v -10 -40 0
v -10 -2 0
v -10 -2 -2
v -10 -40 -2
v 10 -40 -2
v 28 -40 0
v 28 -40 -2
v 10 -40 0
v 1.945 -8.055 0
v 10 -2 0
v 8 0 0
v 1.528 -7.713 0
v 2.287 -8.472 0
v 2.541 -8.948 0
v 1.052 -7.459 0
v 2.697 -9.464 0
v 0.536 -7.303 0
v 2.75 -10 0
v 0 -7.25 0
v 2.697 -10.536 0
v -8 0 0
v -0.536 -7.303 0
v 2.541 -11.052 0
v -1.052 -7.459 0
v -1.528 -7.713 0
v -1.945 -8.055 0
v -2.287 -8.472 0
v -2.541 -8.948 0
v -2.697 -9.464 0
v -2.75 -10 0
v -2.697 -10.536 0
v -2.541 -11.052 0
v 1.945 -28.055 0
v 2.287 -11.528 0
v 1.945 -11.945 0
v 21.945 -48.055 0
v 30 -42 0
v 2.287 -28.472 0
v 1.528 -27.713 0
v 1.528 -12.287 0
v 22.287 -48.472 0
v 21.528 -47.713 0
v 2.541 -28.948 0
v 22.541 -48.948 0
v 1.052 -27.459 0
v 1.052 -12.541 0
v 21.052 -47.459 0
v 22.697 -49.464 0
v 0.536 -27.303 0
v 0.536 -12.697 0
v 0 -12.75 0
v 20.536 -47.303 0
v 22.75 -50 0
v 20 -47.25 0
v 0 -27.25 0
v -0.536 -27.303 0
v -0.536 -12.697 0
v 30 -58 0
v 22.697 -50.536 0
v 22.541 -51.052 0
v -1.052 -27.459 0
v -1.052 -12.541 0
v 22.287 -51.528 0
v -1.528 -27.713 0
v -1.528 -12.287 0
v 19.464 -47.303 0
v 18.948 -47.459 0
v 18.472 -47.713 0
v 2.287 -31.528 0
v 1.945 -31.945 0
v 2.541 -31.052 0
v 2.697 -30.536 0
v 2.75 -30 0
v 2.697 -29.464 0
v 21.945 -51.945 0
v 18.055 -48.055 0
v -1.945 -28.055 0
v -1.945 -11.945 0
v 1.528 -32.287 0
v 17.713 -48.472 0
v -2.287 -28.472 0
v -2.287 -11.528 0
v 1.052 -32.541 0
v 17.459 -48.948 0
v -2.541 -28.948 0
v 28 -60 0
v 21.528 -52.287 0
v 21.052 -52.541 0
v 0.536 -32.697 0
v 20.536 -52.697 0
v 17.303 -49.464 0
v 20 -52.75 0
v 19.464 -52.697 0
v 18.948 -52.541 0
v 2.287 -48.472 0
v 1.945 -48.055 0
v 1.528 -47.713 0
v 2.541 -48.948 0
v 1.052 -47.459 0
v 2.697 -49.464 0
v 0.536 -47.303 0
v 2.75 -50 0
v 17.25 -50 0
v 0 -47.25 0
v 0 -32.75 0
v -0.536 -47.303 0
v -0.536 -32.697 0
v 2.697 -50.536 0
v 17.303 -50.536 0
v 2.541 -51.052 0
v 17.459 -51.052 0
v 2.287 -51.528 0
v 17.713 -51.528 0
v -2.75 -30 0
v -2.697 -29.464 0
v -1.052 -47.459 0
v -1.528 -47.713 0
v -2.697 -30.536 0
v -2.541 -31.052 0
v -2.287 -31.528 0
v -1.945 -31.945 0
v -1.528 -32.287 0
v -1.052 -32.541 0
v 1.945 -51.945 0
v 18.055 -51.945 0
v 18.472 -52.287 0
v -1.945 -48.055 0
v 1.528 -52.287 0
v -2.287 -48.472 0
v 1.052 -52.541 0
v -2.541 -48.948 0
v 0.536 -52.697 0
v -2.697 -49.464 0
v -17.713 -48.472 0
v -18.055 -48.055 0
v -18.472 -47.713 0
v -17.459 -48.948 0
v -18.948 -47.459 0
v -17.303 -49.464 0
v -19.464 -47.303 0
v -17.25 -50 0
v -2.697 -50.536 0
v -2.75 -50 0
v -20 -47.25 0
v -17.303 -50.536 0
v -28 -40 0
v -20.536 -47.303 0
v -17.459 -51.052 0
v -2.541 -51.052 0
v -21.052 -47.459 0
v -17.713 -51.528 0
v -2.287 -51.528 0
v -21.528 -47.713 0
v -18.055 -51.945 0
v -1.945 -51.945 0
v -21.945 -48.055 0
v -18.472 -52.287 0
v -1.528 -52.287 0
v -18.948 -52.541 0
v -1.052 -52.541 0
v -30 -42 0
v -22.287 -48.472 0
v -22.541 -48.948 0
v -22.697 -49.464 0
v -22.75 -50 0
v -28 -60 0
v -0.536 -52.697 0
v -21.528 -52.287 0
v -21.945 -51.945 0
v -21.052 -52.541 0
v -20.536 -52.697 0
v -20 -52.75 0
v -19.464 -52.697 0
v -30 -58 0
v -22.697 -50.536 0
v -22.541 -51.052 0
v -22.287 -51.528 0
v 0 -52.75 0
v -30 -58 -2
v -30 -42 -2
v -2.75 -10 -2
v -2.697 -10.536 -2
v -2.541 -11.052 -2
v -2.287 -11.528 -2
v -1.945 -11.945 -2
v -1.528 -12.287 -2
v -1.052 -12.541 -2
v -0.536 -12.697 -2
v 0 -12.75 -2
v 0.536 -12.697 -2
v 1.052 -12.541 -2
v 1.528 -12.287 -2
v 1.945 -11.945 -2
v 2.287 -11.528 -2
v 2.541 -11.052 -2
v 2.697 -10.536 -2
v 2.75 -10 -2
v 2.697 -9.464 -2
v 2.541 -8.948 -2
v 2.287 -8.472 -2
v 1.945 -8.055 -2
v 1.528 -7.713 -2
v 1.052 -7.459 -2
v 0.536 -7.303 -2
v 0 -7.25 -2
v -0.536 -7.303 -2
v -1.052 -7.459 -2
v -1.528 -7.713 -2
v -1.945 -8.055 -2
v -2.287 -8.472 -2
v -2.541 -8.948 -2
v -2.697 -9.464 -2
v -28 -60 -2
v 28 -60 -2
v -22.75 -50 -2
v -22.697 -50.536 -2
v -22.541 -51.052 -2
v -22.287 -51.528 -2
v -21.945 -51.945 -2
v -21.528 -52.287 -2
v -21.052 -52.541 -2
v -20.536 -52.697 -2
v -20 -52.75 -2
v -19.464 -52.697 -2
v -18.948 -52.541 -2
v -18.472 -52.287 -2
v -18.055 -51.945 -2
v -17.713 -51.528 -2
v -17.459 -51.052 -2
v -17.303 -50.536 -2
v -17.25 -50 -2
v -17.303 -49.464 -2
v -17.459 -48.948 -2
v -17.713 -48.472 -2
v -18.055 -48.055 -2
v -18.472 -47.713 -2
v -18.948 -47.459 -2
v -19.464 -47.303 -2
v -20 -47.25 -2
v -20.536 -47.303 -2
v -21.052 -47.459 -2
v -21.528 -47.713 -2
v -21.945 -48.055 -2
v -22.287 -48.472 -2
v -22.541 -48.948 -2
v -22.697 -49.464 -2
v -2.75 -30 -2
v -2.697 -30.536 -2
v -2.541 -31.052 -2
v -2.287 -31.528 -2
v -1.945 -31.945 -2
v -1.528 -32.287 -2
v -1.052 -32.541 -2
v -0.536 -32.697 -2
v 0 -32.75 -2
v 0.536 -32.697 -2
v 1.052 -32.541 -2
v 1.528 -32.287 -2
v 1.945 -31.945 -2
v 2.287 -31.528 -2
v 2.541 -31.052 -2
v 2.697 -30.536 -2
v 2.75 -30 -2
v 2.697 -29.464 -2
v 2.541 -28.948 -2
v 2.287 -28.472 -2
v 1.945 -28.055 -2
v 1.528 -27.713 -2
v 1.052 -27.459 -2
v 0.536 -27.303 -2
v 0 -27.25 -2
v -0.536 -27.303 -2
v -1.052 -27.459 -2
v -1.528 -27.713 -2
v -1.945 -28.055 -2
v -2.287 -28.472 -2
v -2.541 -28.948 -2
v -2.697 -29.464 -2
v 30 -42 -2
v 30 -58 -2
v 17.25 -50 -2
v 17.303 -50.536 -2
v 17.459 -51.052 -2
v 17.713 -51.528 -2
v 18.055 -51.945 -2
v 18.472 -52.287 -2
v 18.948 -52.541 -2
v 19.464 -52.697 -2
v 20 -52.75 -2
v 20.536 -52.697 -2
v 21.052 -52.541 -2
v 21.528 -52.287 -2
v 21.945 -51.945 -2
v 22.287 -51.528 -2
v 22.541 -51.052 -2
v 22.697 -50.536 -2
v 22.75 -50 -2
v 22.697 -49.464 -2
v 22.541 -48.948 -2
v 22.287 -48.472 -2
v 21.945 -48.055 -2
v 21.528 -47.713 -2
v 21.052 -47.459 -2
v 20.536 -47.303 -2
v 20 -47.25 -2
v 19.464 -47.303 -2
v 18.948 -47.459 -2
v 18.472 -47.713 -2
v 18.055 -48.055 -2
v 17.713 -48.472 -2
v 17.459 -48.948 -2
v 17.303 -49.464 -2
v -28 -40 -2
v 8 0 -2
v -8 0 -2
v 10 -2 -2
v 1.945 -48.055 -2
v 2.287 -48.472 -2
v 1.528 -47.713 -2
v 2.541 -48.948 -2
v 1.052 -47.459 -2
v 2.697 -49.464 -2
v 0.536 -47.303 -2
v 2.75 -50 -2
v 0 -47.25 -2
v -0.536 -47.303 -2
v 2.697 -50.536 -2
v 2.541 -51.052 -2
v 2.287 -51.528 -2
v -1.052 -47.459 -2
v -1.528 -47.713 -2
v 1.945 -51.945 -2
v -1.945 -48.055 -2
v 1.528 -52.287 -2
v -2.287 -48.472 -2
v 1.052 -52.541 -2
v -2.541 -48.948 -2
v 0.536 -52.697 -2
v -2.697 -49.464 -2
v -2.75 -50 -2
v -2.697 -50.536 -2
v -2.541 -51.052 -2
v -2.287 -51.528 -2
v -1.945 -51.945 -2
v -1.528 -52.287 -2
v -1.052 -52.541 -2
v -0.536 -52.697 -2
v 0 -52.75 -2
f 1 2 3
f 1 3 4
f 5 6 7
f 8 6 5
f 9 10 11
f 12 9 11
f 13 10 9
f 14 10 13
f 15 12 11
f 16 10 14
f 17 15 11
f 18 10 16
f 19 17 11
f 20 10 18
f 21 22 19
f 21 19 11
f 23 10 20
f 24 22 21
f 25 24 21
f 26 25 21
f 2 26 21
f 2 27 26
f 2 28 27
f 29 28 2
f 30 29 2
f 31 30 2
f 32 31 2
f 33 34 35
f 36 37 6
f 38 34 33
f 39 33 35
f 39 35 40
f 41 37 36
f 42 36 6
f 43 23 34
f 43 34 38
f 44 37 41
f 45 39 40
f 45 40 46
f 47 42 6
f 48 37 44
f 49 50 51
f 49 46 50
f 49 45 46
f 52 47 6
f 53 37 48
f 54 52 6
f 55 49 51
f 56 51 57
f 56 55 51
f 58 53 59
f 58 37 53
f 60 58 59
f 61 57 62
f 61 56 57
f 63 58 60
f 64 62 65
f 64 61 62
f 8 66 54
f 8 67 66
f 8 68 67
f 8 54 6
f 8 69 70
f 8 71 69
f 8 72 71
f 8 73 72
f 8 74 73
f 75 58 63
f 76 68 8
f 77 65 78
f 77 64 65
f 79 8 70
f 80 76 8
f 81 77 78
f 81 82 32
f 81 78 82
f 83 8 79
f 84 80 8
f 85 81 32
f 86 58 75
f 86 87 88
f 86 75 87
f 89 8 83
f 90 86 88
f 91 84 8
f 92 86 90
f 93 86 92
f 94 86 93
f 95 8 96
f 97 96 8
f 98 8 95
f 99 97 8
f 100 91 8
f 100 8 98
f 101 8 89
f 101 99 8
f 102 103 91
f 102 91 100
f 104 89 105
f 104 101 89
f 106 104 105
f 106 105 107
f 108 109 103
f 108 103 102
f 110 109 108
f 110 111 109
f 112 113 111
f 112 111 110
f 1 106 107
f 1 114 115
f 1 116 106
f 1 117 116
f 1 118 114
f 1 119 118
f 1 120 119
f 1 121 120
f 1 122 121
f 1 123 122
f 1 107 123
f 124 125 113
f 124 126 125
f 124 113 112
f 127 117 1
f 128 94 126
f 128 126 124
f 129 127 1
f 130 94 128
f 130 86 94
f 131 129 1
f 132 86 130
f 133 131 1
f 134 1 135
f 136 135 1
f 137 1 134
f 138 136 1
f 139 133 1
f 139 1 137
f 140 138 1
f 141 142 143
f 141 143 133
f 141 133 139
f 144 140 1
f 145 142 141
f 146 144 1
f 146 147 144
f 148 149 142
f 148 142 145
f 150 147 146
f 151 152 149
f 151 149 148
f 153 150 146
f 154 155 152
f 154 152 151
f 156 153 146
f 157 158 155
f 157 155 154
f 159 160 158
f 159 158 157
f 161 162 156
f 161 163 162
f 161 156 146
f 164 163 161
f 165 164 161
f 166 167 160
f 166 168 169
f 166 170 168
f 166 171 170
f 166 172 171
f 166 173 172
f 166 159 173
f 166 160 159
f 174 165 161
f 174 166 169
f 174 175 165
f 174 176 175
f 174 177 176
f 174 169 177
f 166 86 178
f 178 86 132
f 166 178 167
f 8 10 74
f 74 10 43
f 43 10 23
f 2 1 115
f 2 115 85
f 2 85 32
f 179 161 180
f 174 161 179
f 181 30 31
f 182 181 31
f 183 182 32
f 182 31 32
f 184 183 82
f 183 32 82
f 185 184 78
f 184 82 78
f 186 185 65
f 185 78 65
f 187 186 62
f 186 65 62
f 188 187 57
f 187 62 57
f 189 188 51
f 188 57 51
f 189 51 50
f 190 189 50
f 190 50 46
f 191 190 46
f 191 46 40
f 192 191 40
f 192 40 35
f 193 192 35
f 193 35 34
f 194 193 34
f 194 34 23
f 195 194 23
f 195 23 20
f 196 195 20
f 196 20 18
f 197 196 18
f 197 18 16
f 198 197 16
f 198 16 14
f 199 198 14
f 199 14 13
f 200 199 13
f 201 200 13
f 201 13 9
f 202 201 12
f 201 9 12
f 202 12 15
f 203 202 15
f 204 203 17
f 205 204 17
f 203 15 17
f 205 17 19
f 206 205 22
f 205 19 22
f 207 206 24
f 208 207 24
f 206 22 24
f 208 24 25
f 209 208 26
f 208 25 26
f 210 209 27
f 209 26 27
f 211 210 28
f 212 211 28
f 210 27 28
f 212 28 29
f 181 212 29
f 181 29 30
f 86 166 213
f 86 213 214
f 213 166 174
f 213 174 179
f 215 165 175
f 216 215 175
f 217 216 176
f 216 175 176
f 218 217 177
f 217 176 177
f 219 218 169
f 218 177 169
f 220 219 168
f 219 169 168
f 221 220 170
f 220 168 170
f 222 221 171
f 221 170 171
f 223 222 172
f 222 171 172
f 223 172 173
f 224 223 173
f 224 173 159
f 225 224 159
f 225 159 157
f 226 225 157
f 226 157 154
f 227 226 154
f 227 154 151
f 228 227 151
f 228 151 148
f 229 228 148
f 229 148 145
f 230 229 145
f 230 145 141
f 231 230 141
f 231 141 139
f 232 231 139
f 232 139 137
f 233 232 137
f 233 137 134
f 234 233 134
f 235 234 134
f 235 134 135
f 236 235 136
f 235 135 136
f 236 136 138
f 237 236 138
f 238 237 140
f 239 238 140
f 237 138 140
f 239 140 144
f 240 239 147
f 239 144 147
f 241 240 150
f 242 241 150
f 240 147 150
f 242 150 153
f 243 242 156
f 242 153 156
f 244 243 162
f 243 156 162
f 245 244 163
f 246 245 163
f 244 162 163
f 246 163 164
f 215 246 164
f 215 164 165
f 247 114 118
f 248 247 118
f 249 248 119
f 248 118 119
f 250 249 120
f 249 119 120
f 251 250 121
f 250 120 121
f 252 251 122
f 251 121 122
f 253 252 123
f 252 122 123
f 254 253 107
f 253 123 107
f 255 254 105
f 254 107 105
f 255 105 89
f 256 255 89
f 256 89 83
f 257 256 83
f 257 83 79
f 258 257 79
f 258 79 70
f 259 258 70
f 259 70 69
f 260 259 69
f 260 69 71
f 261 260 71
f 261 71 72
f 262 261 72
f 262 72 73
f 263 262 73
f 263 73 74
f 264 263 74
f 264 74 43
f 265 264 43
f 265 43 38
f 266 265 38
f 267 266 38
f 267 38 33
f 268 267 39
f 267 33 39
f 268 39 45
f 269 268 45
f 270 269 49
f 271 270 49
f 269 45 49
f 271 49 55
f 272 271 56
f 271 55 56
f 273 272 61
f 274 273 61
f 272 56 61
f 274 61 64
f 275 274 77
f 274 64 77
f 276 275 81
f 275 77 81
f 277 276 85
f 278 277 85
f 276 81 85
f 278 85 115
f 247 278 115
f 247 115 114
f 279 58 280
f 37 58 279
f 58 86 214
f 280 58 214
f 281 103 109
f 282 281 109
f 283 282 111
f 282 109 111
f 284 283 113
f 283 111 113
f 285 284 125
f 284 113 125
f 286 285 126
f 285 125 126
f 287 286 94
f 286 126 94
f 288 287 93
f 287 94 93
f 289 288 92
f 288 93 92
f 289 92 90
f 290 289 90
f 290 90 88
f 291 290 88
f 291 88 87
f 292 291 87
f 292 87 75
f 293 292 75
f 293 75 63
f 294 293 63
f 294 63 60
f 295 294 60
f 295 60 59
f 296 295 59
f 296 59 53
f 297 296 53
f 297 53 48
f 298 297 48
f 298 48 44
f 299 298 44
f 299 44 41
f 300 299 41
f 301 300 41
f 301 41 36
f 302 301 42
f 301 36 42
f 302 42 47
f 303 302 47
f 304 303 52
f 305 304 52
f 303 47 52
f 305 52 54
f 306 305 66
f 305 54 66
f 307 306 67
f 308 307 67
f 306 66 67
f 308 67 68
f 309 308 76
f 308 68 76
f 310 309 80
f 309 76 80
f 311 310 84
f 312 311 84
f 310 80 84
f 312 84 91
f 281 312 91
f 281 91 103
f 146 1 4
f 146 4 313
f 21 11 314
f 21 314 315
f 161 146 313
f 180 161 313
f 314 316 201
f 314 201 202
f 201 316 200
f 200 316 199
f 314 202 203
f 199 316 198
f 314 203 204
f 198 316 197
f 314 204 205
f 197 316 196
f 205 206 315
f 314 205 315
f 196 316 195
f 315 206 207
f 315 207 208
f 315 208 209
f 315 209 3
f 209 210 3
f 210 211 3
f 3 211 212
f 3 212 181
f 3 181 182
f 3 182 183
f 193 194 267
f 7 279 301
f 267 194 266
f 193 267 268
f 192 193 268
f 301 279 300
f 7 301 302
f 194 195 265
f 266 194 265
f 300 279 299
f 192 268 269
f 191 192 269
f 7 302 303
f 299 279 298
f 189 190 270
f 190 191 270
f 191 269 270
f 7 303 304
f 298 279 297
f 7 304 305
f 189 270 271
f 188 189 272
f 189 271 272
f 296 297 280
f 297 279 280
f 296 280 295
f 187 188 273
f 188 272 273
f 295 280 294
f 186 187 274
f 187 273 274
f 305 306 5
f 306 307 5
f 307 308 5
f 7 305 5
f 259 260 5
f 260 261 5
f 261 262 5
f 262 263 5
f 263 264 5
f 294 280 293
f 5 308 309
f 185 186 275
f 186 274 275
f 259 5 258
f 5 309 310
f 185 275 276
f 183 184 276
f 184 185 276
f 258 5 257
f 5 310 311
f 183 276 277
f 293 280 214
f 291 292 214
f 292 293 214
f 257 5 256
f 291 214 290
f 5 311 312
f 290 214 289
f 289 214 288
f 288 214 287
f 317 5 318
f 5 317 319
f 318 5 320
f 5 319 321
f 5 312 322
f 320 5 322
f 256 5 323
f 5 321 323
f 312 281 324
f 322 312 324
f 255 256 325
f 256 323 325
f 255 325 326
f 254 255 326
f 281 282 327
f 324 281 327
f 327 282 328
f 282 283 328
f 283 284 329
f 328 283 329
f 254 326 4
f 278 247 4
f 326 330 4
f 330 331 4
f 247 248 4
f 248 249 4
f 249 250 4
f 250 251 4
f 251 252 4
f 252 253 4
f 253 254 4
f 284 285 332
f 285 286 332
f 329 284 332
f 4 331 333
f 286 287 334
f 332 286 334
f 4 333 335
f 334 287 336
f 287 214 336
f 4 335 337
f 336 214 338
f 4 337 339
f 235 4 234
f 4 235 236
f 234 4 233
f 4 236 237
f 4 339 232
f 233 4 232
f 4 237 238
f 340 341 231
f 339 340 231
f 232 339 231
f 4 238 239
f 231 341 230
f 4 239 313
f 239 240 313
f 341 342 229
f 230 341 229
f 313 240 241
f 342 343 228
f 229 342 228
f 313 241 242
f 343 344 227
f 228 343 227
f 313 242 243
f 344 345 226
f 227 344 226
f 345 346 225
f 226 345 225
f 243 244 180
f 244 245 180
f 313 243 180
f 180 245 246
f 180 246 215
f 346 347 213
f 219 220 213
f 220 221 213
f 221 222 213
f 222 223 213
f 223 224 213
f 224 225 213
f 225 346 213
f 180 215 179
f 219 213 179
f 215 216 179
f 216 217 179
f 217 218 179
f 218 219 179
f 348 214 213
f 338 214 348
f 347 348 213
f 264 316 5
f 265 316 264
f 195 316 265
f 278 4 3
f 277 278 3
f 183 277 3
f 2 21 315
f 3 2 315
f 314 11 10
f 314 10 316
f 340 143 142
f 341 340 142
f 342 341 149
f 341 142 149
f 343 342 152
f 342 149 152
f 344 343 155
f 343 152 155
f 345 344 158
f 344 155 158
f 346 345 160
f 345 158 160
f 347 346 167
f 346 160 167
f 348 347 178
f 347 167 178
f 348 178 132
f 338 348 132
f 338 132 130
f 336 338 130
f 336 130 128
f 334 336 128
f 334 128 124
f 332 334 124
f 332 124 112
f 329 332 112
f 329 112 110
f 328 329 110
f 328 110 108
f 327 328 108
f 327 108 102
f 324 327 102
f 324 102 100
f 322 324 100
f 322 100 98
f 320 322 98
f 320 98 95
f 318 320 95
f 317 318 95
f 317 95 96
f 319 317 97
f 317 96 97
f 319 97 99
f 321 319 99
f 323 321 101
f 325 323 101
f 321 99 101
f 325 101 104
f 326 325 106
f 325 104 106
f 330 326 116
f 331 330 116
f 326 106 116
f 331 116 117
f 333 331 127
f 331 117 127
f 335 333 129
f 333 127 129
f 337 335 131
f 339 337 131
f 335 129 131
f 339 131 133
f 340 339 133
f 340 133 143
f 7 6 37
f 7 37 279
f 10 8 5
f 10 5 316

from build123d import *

# Parameters (mm, degrees)
EXTRUDE_1_DEPTH   = 2
HOLE_WIZARD_M51_D = 5.5
CHAMFER_1_SIZE    = 2


with BuildPart() as part:
    # Эскиз1 → Бобышка-Вытянуть1 (new body)
    with BuildSketch(Plane(origin=(0, 0, 0), x_dir=(1, 0, 0), z_dir=(0, 0, -1))):
        Polygon((-30, 60), (30, 60), (30, 40), (10, 40), (10, 0), (-10, 0), (-10, 40), (-30, 40), align=None)
    extrude(amount=EXTRUDE_1_DEPTH)

    # Отверстие с зазором M51 (through all)
    with Locations(Plane(origin=(0, 0, -2), x_dir=(1, 0, 0), z_dir=(0, 0, -1))):
        with Locations((0, 10), (0, 50), (-20, 50), (20, 50), (0, 30)):
            Hole(HOLE_WIZARD_M51_D / 2)

    # Фаска1
    chamfer_1_edges = [part.edges().sort_by_distance(p)[0] for p in [
        (-30, -40, -1),
        (-30, -60, -1),
        (30, -60, -1),
        (30, -40, -1),
        (10, 0, -1),
        (-10, 0, -1),
    ]]
    chamfer(chamfer_1_edges, length=CHAMFER_1_SIZE)


solid = part.part
